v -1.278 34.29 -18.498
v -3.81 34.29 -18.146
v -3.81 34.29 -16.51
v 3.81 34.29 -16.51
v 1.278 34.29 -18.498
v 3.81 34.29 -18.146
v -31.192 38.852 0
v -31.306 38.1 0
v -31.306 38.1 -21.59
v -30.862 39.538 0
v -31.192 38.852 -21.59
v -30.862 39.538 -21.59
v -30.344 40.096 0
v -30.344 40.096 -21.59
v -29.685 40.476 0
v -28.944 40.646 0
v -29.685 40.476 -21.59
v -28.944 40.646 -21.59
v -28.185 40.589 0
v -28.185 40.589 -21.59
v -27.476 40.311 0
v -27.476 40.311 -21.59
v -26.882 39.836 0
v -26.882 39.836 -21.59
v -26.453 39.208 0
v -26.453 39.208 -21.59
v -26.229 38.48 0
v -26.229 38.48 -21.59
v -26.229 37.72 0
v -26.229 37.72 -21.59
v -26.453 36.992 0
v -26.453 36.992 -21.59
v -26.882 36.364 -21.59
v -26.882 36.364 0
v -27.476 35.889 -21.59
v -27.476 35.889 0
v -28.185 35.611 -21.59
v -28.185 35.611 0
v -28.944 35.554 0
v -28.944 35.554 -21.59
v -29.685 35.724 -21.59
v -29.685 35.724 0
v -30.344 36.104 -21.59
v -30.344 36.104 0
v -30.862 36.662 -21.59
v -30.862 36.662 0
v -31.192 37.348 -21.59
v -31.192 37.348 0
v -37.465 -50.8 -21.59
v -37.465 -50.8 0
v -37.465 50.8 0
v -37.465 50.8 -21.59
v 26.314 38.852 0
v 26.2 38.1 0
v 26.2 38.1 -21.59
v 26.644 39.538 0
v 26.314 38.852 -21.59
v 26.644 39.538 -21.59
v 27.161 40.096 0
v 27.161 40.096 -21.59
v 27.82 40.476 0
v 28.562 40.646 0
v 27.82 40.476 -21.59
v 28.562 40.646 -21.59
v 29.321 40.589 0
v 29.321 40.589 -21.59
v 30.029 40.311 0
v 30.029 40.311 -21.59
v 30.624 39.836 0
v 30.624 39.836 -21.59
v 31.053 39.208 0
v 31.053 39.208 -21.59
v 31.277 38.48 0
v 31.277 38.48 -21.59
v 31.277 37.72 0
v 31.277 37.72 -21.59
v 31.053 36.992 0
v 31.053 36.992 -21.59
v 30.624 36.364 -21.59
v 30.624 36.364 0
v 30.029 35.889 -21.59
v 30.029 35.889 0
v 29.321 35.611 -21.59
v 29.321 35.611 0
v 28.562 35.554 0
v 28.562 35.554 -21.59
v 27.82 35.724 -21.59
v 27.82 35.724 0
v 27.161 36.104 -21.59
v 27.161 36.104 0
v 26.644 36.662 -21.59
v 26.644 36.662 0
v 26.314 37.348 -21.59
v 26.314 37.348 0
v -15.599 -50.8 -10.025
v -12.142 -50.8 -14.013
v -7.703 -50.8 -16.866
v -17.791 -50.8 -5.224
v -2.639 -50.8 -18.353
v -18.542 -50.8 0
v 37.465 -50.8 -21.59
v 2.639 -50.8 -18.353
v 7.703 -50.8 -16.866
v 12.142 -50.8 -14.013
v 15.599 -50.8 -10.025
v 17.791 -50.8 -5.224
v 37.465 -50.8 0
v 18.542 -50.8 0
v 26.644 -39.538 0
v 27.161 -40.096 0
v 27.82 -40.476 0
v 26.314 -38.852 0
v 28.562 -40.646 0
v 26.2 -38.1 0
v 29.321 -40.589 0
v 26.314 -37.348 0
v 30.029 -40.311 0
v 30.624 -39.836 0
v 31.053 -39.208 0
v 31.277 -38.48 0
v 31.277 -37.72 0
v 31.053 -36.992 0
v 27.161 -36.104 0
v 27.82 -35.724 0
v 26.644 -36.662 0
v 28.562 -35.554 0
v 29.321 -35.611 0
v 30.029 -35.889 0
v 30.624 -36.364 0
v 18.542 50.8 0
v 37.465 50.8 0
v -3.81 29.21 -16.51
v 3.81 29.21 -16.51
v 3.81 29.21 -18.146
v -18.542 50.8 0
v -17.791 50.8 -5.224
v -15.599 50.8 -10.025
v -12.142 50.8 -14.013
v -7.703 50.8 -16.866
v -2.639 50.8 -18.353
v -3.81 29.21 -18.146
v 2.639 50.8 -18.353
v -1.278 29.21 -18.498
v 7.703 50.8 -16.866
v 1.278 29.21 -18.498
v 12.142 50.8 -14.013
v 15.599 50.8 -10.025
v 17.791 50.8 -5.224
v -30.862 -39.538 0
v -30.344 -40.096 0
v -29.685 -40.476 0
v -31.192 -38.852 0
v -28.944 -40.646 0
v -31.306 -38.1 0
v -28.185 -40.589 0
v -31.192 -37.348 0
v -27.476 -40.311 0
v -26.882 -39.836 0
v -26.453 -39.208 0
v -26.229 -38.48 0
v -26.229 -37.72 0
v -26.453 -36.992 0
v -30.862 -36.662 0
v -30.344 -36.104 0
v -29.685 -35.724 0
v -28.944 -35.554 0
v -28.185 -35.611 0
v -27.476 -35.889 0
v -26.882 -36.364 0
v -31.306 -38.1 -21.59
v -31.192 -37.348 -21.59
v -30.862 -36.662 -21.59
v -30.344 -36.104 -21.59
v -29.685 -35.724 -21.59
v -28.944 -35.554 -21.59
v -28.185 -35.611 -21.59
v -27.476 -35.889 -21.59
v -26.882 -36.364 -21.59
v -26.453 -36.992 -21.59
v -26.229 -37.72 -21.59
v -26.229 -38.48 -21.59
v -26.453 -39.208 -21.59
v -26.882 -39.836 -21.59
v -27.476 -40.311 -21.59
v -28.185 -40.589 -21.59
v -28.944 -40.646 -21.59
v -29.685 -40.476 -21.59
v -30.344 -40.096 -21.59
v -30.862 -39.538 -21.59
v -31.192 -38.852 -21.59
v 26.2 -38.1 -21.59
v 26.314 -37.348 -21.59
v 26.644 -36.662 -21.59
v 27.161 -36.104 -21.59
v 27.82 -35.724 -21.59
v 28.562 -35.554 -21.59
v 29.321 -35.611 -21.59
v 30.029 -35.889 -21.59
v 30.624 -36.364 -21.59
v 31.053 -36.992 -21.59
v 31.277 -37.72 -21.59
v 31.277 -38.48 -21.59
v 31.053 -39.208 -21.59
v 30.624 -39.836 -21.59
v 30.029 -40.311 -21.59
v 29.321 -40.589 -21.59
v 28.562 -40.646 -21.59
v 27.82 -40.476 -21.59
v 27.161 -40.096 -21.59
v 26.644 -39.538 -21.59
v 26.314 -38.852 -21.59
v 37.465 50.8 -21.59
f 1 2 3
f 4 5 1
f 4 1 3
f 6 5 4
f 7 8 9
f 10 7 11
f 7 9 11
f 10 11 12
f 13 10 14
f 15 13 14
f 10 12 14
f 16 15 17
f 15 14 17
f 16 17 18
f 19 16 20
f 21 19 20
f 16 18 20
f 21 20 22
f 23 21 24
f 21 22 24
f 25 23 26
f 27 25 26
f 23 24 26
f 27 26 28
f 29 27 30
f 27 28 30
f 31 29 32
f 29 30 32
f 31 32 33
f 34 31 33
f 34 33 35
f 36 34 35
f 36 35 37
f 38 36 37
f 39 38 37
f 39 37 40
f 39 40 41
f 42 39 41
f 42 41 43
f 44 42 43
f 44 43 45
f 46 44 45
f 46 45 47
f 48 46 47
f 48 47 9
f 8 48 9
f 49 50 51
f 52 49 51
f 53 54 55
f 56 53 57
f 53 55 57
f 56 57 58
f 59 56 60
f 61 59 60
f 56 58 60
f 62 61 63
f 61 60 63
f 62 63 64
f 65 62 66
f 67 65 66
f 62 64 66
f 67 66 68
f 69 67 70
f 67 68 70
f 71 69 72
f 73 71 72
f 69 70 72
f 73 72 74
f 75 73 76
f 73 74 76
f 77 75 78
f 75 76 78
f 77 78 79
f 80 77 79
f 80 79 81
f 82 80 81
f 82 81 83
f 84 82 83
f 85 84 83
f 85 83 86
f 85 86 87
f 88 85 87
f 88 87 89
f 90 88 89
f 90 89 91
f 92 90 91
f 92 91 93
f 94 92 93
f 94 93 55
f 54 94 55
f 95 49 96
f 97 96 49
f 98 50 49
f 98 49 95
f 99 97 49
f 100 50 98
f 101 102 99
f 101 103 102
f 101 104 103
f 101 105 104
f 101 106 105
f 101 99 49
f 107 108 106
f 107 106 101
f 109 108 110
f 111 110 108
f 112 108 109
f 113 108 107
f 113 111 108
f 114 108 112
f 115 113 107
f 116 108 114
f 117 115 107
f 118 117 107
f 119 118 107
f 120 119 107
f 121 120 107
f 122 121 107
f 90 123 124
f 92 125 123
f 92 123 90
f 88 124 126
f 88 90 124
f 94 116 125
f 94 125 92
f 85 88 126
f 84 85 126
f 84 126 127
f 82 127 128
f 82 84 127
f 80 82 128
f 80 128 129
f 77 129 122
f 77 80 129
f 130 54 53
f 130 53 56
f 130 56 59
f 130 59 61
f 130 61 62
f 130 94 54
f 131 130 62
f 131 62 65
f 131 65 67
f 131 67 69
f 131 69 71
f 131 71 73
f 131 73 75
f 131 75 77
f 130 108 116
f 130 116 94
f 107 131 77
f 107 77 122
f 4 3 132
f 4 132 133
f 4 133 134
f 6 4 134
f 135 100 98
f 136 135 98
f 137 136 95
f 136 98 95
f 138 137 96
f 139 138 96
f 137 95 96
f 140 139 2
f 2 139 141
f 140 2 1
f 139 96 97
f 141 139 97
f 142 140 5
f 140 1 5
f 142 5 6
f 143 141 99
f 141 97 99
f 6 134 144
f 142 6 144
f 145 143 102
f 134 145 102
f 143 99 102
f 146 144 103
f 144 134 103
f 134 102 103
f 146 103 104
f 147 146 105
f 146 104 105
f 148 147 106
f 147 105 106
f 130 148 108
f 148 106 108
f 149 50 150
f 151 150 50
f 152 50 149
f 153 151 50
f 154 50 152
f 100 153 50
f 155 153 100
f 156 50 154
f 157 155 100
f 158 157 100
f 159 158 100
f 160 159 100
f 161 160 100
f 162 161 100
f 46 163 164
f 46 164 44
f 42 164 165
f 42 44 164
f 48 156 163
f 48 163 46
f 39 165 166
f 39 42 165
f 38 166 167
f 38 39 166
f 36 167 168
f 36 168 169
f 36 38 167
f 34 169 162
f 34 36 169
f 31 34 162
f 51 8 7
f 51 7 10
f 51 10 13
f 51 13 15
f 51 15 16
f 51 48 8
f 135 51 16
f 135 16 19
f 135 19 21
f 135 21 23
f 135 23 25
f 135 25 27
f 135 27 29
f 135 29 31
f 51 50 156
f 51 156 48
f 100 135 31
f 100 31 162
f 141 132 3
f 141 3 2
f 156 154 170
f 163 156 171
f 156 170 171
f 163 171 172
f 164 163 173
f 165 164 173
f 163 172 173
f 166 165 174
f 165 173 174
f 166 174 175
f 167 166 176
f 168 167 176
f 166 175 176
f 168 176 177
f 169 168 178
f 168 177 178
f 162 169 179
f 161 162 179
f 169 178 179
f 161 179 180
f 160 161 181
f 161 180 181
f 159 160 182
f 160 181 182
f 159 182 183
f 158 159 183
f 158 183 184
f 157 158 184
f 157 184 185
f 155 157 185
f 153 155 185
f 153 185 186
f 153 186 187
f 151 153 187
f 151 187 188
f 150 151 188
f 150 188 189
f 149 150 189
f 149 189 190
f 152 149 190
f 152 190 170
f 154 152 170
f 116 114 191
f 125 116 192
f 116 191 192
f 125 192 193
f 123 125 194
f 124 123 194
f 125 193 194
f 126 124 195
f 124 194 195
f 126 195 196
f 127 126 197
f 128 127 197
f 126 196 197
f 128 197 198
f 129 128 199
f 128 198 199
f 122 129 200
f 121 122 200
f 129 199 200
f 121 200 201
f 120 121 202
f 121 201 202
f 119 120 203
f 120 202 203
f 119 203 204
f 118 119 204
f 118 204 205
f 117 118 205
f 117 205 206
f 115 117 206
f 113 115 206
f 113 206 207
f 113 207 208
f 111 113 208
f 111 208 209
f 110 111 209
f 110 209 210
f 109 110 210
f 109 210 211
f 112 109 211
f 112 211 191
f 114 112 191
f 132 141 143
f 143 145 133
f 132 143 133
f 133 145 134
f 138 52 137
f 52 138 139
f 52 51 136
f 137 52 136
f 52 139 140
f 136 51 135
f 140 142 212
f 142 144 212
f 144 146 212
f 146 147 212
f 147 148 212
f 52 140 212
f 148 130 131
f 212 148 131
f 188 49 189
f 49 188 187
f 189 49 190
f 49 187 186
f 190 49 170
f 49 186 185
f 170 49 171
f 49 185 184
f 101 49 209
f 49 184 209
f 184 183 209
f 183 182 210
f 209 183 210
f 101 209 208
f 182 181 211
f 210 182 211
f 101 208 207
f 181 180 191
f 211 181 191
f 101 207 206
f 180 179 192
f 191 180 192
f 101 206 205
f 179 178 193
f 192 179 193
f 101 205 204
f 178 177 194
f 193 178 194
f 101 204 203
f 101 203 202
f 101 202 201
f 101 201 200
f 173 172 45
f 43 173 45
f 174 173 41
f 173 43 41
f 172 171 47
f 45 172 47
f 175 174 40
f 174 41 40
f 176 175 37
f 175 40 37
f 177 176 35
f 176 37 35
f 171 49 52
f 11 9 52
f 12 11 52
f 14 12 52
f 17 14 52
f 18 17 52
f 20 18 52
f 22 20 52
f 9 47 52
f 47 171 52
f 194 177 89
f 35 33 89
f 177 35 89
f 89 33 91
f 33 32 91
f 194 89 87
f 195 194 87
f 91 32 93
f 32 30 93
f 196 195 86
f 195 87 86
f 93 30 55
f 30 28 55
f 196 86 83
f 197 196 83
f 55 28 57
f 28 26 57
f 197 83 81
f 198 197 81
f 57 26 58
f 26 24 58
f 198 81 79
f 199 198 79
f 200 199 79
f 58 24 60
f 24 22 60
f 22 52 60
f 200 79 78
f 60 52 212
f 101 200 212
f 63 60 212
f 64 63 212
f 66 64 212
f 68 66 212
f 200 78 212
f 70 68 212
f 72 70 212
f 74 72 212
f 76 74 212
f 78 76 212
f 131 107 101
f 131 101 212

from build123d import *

# Parameters (mm, degrees)
SKETCH1_W                   = 74.93
SKETCH1_H                   = 101.6
BOSS_EXTRUDE2_DEPTH         = 21.59
CUT_EXTRUDE2_DEPTH          = 111.418813275
CUT_EXTRUDE2_DEPTH_BACK     = 111.418813275
SKETCH4_W                   = 7.62
SKETCH4_H                   = 5.08
BOSS_EXTRUDE3_DEPTH         = 2.54
TAP_DRILL_FOR_1_4_20_TAP1_D = 5.1054


with BuildPart() as part:
    # Sketch1 → Boss-Extrude2 (new body)
    with BuildSketch(Plane.XY):
        Rectangle(SKETCH1_W, SKETCH1_H)
    extrude(amount=-BOSS_EXTRUDE2_DEPTH)

    # Sketch2 → Cut-Extrude2 (cut, two sides: drawn at the far end of the back side and taken through both)
    with BuildSketch(Plane(origin=(0, 50.8, 0), x_dir=(1, 0, 0), z_dir=(0, 1, 0)).offset(-CUT_EXTRUDE2_DEPTH_BACK)):
        with BuildLine():
            Line((-18.542, -130.048526005), (-18.542, 0))
            ThreePointArc((-18.542, 0), (0, 18.542), (18.542, 0))
            Line((18.542, 0), (18.542, -130.048526005))
            Line((18.542, -130.048526005), (18.542, -390.145578015))
            Line((18.542, -390.145578015), (-18.542, -390.145578015))
            Line((-18.542, -390.145578015), (-18.542, -130.048526005))
        make_face()
    extrude(amount=CUT_EXTRUDE2_DEPTH + CUT_EXTRUDE2_DEPTH_BACK, mode=Mode.SUBTRACT)

    # Sketch4 → Boss-Extrude3 (add, symmetric)
    with BuildSketch(Plane(origin=(0, 31.75, 0), x_dir=(1, 0, 0), z_dir=(0, 1, 0))):
        with Locations((0, 19.05)):
            Rectangle(SKETCH4_W, SKETCH4_H)
    extrude(amount=BOSS_EXTRUDE3_DEPTH, both=True)

    # Tap Drill for 1/4-20 Tap1 (through all)
    with Locations(Plane.XY):
        with Locations((-28.7528, 38.1), (28.7528, 38.1), (-28.7528, -38.1), (28.7528, -38.1)):
            Hole(TAP_DRILL_FOR_1_4_20_TAP1_D / 2)


solid = part.part
